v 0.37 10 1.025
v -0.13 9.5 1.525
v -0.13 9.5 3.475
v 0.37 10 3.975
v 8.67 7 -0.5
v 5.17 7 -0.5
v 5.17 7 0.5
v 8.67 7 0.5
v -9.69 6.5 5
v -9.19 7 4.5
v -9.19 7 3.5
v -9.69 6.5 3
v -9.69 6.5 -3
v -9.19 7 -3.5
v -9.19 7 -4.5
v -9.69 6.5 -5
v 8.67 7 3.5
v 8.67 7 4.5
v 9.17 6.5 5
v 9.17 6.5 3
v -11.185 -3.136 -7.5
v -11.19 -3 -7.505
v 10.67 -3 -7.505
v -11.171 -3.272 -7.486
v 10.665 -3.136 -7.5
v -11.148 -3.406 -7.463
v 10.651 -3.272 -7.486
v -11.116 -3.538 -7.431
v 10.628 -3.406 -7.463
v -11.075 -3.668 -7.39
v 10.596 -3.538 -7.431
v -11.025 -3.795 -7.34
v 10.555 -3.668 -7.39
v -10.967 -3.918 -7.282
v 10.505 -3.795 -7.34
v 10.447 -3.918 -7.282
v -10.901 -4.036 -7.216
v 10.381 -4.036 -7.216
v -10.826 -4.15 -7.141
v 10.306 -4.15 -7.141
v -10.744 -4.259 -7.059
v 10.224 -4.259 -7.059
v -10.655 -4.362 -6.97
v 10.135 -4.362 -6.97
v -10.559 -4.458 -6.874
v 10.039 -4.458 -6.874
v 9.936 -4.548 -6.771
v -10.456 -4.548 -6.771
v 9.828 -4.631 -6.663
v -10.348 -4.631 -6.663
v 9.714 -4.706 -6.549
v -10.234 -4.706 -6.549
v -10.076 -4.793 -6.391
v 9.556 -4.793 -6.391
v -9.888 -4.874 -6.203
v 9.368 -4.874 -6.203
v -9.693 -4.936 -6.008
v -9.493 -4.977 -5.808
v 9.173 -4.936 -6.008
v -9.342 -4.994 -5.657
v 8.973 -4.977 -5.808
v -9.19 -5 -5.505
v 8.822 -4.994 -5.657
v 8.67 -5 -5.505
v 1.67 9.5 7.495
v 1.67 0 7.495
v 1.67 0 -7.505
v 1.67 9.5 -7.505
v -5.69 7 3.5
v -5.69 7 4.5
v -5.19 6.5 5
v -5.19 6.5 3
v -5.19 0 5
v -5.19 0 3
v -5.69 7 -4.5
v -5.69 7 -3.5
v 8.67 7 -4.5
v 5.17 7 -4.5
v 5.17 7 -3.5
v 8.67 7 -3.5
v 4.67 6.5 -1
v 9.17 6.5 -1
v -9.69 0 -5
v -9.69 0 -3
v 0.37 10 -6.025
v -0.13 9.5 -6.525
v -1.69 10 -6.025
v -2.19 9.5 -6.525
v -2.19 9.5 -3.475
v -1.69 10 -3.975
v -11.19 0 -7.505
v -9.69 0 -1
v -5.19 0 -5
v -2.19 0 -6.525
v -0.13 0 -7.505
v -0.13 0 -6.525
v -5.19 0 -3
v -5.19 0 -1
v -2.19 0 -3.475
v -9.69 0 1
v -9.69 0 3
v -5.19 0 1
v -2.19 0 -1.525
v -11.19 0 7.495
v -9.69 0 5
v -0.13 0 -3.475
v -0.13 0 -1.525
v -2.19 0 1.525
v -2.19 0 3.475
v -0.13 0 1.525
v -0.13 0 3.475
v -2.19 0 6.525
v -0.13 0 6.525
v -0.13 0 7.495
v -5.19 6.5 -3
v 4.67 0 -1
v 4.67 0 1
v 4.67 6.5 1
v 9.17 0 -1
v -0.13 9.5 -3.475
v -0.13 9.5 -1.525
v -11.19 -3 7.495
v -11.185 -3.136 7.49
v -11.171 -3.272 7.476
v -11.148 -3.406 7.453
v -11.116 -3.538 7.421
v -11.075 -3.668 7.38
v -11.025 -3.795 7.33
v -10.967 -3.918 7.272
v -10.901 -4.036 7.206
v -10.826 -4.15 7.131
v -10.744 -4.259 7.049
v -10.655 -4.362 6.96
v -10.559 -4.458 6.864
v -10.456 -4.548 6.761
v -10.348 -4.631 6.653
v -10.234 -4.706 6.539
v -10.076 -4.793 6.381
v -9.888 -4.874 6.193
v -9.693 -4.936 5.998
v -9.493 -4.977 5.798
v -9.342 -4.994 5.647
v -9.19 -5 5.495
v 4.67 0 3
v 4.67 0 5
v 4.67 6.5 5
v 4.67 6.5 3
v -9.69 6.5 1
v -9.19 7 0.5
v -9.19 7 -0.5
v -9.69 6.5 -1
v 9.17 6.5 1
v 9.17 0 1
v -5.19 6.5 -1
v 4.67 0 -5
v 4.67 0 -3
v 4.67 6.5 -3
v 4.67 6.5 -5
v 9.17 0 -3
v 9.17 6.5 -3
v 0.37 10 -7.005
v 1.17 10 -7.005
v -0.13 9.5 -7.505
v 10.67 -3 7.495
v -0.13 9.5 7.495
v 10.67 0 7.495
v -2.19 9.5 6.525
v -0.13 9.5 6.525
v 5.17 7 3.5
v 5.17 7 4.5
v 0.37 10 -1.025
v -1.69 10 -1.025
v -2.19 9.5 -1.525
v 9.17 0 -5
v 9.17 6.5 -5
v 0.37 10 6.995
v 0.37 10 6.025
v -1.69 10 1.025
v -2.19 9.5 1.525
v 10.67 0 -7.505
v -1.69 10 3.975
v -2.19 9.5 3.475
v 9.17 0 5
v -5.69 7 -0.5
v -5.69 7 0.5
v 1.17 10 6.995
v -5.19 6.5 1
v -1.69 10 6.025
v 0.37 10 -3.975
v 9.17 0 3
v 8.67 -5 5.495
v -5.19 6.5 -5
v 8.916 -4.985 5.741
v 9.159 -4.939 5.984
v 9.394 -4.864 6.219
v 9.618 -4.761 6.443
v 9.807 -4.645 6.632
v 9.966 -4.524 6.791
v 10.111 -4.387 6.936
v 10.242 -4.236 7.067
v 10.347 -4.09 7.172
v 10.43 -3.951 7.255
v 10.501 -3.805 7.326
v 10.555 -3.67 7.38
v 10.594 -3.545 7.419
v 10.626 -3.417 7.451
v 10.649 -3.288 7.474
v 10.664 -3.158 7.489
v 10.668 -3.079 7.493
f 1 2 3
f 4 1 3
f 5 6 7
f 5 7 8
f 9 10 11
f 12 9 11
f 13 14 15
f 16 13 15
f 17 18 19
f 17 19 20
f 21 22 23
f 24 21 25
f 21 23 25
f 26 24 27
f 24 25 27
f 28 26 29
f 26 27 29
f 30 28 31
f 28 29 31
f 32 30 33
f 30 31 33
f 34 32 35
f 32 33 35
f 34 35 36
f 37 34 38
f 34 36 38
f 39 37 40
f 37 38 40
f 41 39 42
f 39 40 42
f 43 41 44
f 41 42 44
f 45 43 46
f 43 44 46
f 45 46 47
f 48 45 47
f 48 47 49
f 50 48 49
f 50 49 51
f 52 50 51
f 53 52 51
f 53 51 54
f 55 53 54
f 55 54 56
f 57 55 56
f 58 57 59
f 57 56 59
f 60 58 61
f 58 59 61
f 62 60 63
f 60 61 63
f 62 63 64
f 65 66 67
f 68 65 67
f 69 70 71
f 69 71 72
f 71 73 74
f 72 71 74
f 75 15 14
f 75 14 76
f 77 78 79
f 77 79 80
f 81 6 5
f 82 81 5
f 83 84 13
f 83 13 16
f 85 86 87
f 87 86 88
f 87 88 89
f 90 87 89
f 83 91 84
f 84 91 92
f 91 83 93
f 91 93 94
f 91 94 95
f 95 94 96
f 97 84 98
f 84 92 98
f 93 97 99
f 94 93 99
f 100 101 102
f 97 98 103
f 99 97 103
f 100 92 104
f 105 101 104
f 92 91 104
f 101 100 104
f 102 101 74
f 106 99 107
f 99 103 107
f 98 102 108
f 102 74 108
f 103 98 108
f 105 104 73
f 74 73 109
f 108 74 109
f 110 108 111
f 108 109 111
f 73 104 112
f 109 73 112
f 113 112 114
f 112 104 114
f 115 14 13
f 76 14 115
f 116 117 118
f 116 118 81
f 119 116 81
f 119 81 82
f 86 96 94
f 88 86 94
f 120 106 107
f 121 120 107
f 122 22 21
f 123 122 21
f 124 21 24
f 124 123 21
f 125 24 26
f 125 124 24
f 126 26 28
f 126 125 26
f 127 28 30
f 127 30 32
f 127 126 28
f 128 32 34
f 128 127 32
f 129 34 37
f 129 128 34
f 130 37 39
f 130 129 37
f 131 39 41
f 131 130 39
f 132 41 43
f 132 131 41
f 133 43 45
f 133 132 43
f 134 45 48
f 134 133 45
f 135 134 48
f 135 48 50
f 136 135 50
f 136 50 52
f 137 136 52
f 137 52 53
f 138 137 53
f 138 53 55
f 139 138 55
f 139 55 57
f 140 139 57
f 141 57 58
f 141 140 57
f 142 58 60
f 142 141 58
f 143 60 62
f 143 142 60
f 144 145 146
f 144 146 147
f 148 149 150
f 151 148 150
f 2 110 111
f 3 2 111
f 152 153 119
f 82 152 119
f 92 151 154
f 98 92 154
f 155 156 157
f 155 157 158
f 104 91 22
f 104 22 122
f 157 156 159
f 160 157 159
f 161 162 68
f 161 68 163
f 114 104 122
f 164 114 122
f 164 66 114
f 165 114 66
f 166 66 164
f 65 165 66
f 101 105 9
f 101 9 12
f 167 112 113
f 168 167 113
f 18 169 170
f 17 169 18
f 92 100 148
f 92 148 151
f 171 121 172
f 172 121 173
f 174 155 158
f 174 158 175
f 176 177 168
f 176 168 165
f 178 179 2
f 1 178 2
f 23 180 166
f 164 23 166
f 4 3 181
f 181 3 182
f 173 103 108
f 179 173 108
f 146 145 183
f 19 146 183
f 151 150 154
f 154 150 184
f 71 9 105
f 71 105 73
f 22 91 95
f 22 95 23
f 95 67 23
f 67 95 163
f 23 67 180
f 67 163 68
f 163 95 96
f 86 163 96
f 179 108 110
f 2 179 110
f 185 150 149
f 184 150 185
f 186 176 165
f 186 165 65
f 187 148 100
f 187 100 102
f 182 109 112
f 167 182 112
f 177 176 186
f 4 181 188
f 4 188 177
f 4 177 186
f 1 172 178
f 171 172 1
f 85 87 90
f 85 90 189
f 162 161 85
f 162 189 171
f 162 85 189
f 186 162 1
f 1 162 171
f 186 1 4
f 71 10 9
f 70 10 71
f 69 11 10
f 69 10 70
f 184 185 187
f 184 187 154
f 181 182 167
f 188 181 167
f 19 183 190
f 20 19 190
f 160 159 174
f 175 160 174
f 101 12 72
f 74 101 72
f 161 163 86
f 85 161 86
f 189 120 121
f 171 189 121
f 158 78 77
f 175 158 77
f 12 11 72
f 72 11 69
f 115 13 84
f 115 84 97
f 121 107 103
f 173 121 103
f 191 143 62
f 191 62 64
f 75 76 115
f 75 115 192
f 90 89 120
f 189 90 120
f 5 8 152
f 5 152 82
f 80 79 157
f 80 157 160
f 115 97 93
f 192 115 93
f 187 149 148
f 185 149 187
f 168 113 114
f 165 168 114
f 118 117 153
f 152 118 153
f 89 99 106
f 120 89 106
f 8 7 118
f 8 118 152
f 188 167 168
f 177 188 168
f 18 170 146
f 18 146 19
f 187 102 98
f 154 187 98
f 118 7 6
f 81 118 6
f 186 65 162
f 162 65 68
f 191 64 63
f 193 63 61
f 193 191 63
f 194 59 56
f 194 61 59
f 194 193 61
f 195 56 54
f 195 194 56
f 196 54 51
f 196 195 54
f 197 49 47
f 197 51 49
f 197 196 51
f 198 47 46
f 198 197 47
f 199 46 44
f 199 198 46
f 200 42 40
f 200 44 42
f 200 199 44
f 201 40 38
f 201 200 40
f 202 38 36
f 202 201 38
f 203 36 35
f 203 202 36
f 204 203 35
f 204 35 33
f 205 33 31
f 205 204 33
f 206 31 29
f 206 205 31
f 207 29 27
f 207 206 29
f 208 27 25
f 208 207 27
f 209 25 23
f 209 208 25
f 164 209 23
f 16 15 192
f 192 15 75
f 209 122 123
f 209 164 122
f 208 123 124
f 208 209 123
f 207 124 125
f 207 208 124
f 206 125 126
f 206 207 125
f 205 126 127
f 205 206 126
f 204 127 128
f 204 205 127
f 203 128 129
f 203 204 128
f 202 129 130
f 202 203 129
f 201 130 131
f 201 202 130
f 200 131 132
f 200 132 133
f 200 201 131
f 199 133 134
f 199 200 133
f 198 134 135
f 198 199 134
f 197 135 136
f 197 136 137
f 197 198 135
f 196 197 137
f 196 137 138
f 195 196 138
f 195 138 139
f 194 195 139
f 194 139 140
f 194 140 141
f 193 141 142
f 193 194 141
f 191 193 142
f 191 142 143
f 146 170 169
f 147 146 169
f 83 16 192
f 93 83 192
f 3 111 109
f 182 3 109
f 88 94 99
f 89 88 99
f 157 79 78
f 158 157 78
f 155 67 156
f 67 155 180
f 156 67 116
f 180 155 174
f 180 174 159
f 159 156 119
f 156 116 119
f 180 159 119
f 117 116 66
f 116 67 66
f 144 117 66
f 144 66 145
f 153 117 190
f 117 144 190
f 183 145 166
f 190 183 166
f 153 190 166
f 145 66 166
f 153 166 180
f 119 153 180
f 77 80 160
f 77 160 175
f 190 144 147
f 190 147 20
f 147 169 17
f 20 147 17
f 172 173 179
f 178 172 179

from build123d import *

# Parameters (mm, degrees)
EXTRUDE_1_DEPTH   = 7
SKETCH_1_W        = 4.5
SKETCH_1_H        = 2
EXTRUDE_1_2_DEPTH = 7
EXTRUDE_1_3_DEPTH = 7
EXTRUDE_1_4_DEPTH = 7
EXTRUDE_1_5_DEPTH = 7
EXTRUDE_1_6_DEPTH = 7
EXTRUDE_1_7_DEPTH = 7
EXTRUDE_2_DEPTH   = 3
SKETCH_3_W        = 21.86
SKETCH_3_H        = 15
EXTRUDE_3_DEPTH   = 5
FILLET_1_R        = 2
CHAMFER_1_SIZE    = 0.5


with BuildPart() as part:
    # 草图1 → 凸台-拉伸1 (new body)
    with BuildSketch(Plane(origin=(0, 0, 0), x_dir=(1, 0, 0), z_dir=(0, 1, 0))):
        Polygon((-0.13, 3.475), (-0.13, 1.525), (-2.19, 1.525), (-2.19, -1.525), (-0.13, -1.525), (-0.13, -3.475), (-2.19, -3.475), (-2.19, -6.525), (-0.13, -6.525), (-0.13, -7.495), (1.67, -7.495), (1.67, 7.505), (-0.13, 7.505), (-0.13, 6.525), (-2.19, 6.525), (-2.19, 3.475), align=None)
    extrude(amount=EXTRUDE_1_DEPTH)

    # 草图2 → 凸台-拉伸2 (add)
    with BuildSketch(Plane(origin=(0, 7, 0), x_dir=(1, 0, 0), z_dir=(0, 1, 0))):
        Polygon((-0.13, 7.505), (-0.13, 6.525), (-2.19, 6.525), (-2.19, 3.475), (-0.13, 3.475), (-0.13, 1.525), (-2.19, 1.525), (-2.19, -1.525), (-0.13, -1.525), (-0.13, -3.475), (-2.19, -3.475), (-2.19, -6.525), (-0.13, -6.525), (-0.13, -7.495), (1.67, -7.495), (1.67, 7.505), align=None)
    extrude(amount=EXTRUDE_2_DEPTH)



with BuildPart() as body_2:
    # 草图1 → Extrude 1 2 (new body)
    with BuildSketch(Plane(origin=(0, 0, 0), x_dir=(1, 0, 0), z_dir=(0, 1, 0))):
        with Locations((-7.44, 4)):
            Rectangle(SKETCH_1_W, SKETCH_1_H)
    extrude(amount=EXTRUDE_1_2_DEPTH)


with BuildPart() as body_3:
    # 草图1 → Extrude 1 3 (new body)
    with BuildSketch(Plane(origin=(0, 0, 0), x_dir=(1, 0, 0), z_dir=(0, 1, 0))):
        with Locations((-7.44, 0)):
            Rectangle(SKETCH_1_W, SKETCH_1_H)
    extrude(amount=EXTRUDE_1_3_DEPTH)


with BuildPart() as body_4:
    # 草图1 → Extrude 1 4 (new body)
    with BuildSketch(Plane(origin=(0, 0, 0), x_dir=(1, 0, 0), z_dir=(0, 1, 0))):
        with Locations((-7.44, -4)):
            Rectangle(SKETCH_1_W, SKETCH_1_H)
    extrude(amount=EXTRUDE_1_4_DEPTH)


with BuildPart() as body_5:
    # 草图1 → Extrude 1 5 (new body)
    with BuildSketch(Plane(origin=(0, 0, 0), x_dir=(1, 0, 0), z_dir=(0, 1, 0))):
        with Locations((6.92, 4)):
            Rectangle(SKETCH_1_W, SKETCH_1_H)
    extrude(amount=EXTRUDE_1_5_DEPTH)


with BuildPart() as body_6:
    # 草图1 → Extrude 1 6 (new body)
    with BuildSketch(Plane(origin=(0, 0, 0), x_dir=(1, 0, 0), z_dir=(0, 1, 0))):
        with Locations((6.92, 0)):
            Rectangle(SKETCH_1_W, SKETCH_1_H)
    extrude(amount=EXTRUDE_1_6_DEPTH)


with BuildPart() as body_7:
    # 草图1 → Extrude 1 7 (new body)
    with BuildSketch(Plane(origin=(0, 0, 0), x_dir=(1, 0, 0), z_dir=(0, 1, 0))):
        with Locations((6.92, -4)):
            Rectangle(SKETCH_1_W, SKETCH_1_H)
    extrude(amount=EXTRUDE_1_7_DEPTH)


with BuildPart() as part_1:
    add(part.part)

    add(body_2.part)  # 凸台-拉伸3 merges body 2

    add(body_3.part)  # 凸台-拉伸3 merges body 3

    add(body_4.part)  # 凸台-拉伸3 merges body 4

    add(body_5.part)  # 凸台-拉伸3 merges body 5

    add(body_6.part)  # 凸台-拉伸3 merges body 6

    add(body_7.part)  # 凸台-拉伸3 merges body 7
    # 草图3 → 凸台-拉伸3 (add)
    with BuildSketch(Plane.XZ):
        with Locations((-0.26, -0.005)):
            Rectangle(SKETCH_3_W, SKETCH_3_H)
    extrude(amount=EXTRUDE_3_DEPTH)

    # 圆角1
    fillet_1_edges = [part_1.edges().sort_by_distance(p)[0] for p in [
        (-11.19, -5, -0.005),
        (-0.26, -5, -7.505),
        (10.67, -5, -0.005),
        (-0.26, -5, 7.495),
    ]]
    fillet(fillet_1_edges, radius=FILLET_1_R)

    # 倒角1
    chamfer_1_edges = [part_1.edges().sort_by_distance(p)[0] for p in [
        (-5.19, 7, -4),
        (-7.44, 7, -5),
        (-9.69, 7, 0),
        (-7.44, 7, 1),
        (-5.19, 7, 0),
        (-7.44, 7, -1),
        (-9.69, 7, 4),
        (-7.44, 7, 5),
        (-5.19, 7, 4),
        (-7.44, 7, 3),
        (-9.69, 7, -4),
        (4.67, 7, -4),
        (6.92, 7, -3),
        (9.17, 7, -4),
        (6.92, 7, -5),
        (4.67, 7, 0),
        (6.92, 7, 1),
        (9.17, 7, 0),
        (6.92, 7, -1),
        (9.17, 7, 4),
        (6.92, 7, 3),
        (4.67, 7, 4),
        (6.92, 7, 5),
        (-7.44, 7, -3),
        (0.77, 10, -7.505),
        (-0.13, 10, -7.015),
        (-1.16, 10, -6.525),
        (-2.19, 10, -5),
        (-1.16, 10, -3.475),
        (-0.13, 10, -2.5),
        (-1.16, 10, -1.525),
        (-2.19, 10, 0),
        (-1.16, 10, 1.525),
        (-0.13, 10, 2.5),
        (-1.16, 10, 3.475),
        (-2.19, 10, 5),
        (-1.16, 10, 6.525),
        (-0.13, 10, 7.01),
        (0.77, 10, 7.495),
        (1.67, 10, -0.005),
    ]]
    chamfer(chamfer_1_edges, length=CHAMFER_1_SIZE)


solid = part_1.part
